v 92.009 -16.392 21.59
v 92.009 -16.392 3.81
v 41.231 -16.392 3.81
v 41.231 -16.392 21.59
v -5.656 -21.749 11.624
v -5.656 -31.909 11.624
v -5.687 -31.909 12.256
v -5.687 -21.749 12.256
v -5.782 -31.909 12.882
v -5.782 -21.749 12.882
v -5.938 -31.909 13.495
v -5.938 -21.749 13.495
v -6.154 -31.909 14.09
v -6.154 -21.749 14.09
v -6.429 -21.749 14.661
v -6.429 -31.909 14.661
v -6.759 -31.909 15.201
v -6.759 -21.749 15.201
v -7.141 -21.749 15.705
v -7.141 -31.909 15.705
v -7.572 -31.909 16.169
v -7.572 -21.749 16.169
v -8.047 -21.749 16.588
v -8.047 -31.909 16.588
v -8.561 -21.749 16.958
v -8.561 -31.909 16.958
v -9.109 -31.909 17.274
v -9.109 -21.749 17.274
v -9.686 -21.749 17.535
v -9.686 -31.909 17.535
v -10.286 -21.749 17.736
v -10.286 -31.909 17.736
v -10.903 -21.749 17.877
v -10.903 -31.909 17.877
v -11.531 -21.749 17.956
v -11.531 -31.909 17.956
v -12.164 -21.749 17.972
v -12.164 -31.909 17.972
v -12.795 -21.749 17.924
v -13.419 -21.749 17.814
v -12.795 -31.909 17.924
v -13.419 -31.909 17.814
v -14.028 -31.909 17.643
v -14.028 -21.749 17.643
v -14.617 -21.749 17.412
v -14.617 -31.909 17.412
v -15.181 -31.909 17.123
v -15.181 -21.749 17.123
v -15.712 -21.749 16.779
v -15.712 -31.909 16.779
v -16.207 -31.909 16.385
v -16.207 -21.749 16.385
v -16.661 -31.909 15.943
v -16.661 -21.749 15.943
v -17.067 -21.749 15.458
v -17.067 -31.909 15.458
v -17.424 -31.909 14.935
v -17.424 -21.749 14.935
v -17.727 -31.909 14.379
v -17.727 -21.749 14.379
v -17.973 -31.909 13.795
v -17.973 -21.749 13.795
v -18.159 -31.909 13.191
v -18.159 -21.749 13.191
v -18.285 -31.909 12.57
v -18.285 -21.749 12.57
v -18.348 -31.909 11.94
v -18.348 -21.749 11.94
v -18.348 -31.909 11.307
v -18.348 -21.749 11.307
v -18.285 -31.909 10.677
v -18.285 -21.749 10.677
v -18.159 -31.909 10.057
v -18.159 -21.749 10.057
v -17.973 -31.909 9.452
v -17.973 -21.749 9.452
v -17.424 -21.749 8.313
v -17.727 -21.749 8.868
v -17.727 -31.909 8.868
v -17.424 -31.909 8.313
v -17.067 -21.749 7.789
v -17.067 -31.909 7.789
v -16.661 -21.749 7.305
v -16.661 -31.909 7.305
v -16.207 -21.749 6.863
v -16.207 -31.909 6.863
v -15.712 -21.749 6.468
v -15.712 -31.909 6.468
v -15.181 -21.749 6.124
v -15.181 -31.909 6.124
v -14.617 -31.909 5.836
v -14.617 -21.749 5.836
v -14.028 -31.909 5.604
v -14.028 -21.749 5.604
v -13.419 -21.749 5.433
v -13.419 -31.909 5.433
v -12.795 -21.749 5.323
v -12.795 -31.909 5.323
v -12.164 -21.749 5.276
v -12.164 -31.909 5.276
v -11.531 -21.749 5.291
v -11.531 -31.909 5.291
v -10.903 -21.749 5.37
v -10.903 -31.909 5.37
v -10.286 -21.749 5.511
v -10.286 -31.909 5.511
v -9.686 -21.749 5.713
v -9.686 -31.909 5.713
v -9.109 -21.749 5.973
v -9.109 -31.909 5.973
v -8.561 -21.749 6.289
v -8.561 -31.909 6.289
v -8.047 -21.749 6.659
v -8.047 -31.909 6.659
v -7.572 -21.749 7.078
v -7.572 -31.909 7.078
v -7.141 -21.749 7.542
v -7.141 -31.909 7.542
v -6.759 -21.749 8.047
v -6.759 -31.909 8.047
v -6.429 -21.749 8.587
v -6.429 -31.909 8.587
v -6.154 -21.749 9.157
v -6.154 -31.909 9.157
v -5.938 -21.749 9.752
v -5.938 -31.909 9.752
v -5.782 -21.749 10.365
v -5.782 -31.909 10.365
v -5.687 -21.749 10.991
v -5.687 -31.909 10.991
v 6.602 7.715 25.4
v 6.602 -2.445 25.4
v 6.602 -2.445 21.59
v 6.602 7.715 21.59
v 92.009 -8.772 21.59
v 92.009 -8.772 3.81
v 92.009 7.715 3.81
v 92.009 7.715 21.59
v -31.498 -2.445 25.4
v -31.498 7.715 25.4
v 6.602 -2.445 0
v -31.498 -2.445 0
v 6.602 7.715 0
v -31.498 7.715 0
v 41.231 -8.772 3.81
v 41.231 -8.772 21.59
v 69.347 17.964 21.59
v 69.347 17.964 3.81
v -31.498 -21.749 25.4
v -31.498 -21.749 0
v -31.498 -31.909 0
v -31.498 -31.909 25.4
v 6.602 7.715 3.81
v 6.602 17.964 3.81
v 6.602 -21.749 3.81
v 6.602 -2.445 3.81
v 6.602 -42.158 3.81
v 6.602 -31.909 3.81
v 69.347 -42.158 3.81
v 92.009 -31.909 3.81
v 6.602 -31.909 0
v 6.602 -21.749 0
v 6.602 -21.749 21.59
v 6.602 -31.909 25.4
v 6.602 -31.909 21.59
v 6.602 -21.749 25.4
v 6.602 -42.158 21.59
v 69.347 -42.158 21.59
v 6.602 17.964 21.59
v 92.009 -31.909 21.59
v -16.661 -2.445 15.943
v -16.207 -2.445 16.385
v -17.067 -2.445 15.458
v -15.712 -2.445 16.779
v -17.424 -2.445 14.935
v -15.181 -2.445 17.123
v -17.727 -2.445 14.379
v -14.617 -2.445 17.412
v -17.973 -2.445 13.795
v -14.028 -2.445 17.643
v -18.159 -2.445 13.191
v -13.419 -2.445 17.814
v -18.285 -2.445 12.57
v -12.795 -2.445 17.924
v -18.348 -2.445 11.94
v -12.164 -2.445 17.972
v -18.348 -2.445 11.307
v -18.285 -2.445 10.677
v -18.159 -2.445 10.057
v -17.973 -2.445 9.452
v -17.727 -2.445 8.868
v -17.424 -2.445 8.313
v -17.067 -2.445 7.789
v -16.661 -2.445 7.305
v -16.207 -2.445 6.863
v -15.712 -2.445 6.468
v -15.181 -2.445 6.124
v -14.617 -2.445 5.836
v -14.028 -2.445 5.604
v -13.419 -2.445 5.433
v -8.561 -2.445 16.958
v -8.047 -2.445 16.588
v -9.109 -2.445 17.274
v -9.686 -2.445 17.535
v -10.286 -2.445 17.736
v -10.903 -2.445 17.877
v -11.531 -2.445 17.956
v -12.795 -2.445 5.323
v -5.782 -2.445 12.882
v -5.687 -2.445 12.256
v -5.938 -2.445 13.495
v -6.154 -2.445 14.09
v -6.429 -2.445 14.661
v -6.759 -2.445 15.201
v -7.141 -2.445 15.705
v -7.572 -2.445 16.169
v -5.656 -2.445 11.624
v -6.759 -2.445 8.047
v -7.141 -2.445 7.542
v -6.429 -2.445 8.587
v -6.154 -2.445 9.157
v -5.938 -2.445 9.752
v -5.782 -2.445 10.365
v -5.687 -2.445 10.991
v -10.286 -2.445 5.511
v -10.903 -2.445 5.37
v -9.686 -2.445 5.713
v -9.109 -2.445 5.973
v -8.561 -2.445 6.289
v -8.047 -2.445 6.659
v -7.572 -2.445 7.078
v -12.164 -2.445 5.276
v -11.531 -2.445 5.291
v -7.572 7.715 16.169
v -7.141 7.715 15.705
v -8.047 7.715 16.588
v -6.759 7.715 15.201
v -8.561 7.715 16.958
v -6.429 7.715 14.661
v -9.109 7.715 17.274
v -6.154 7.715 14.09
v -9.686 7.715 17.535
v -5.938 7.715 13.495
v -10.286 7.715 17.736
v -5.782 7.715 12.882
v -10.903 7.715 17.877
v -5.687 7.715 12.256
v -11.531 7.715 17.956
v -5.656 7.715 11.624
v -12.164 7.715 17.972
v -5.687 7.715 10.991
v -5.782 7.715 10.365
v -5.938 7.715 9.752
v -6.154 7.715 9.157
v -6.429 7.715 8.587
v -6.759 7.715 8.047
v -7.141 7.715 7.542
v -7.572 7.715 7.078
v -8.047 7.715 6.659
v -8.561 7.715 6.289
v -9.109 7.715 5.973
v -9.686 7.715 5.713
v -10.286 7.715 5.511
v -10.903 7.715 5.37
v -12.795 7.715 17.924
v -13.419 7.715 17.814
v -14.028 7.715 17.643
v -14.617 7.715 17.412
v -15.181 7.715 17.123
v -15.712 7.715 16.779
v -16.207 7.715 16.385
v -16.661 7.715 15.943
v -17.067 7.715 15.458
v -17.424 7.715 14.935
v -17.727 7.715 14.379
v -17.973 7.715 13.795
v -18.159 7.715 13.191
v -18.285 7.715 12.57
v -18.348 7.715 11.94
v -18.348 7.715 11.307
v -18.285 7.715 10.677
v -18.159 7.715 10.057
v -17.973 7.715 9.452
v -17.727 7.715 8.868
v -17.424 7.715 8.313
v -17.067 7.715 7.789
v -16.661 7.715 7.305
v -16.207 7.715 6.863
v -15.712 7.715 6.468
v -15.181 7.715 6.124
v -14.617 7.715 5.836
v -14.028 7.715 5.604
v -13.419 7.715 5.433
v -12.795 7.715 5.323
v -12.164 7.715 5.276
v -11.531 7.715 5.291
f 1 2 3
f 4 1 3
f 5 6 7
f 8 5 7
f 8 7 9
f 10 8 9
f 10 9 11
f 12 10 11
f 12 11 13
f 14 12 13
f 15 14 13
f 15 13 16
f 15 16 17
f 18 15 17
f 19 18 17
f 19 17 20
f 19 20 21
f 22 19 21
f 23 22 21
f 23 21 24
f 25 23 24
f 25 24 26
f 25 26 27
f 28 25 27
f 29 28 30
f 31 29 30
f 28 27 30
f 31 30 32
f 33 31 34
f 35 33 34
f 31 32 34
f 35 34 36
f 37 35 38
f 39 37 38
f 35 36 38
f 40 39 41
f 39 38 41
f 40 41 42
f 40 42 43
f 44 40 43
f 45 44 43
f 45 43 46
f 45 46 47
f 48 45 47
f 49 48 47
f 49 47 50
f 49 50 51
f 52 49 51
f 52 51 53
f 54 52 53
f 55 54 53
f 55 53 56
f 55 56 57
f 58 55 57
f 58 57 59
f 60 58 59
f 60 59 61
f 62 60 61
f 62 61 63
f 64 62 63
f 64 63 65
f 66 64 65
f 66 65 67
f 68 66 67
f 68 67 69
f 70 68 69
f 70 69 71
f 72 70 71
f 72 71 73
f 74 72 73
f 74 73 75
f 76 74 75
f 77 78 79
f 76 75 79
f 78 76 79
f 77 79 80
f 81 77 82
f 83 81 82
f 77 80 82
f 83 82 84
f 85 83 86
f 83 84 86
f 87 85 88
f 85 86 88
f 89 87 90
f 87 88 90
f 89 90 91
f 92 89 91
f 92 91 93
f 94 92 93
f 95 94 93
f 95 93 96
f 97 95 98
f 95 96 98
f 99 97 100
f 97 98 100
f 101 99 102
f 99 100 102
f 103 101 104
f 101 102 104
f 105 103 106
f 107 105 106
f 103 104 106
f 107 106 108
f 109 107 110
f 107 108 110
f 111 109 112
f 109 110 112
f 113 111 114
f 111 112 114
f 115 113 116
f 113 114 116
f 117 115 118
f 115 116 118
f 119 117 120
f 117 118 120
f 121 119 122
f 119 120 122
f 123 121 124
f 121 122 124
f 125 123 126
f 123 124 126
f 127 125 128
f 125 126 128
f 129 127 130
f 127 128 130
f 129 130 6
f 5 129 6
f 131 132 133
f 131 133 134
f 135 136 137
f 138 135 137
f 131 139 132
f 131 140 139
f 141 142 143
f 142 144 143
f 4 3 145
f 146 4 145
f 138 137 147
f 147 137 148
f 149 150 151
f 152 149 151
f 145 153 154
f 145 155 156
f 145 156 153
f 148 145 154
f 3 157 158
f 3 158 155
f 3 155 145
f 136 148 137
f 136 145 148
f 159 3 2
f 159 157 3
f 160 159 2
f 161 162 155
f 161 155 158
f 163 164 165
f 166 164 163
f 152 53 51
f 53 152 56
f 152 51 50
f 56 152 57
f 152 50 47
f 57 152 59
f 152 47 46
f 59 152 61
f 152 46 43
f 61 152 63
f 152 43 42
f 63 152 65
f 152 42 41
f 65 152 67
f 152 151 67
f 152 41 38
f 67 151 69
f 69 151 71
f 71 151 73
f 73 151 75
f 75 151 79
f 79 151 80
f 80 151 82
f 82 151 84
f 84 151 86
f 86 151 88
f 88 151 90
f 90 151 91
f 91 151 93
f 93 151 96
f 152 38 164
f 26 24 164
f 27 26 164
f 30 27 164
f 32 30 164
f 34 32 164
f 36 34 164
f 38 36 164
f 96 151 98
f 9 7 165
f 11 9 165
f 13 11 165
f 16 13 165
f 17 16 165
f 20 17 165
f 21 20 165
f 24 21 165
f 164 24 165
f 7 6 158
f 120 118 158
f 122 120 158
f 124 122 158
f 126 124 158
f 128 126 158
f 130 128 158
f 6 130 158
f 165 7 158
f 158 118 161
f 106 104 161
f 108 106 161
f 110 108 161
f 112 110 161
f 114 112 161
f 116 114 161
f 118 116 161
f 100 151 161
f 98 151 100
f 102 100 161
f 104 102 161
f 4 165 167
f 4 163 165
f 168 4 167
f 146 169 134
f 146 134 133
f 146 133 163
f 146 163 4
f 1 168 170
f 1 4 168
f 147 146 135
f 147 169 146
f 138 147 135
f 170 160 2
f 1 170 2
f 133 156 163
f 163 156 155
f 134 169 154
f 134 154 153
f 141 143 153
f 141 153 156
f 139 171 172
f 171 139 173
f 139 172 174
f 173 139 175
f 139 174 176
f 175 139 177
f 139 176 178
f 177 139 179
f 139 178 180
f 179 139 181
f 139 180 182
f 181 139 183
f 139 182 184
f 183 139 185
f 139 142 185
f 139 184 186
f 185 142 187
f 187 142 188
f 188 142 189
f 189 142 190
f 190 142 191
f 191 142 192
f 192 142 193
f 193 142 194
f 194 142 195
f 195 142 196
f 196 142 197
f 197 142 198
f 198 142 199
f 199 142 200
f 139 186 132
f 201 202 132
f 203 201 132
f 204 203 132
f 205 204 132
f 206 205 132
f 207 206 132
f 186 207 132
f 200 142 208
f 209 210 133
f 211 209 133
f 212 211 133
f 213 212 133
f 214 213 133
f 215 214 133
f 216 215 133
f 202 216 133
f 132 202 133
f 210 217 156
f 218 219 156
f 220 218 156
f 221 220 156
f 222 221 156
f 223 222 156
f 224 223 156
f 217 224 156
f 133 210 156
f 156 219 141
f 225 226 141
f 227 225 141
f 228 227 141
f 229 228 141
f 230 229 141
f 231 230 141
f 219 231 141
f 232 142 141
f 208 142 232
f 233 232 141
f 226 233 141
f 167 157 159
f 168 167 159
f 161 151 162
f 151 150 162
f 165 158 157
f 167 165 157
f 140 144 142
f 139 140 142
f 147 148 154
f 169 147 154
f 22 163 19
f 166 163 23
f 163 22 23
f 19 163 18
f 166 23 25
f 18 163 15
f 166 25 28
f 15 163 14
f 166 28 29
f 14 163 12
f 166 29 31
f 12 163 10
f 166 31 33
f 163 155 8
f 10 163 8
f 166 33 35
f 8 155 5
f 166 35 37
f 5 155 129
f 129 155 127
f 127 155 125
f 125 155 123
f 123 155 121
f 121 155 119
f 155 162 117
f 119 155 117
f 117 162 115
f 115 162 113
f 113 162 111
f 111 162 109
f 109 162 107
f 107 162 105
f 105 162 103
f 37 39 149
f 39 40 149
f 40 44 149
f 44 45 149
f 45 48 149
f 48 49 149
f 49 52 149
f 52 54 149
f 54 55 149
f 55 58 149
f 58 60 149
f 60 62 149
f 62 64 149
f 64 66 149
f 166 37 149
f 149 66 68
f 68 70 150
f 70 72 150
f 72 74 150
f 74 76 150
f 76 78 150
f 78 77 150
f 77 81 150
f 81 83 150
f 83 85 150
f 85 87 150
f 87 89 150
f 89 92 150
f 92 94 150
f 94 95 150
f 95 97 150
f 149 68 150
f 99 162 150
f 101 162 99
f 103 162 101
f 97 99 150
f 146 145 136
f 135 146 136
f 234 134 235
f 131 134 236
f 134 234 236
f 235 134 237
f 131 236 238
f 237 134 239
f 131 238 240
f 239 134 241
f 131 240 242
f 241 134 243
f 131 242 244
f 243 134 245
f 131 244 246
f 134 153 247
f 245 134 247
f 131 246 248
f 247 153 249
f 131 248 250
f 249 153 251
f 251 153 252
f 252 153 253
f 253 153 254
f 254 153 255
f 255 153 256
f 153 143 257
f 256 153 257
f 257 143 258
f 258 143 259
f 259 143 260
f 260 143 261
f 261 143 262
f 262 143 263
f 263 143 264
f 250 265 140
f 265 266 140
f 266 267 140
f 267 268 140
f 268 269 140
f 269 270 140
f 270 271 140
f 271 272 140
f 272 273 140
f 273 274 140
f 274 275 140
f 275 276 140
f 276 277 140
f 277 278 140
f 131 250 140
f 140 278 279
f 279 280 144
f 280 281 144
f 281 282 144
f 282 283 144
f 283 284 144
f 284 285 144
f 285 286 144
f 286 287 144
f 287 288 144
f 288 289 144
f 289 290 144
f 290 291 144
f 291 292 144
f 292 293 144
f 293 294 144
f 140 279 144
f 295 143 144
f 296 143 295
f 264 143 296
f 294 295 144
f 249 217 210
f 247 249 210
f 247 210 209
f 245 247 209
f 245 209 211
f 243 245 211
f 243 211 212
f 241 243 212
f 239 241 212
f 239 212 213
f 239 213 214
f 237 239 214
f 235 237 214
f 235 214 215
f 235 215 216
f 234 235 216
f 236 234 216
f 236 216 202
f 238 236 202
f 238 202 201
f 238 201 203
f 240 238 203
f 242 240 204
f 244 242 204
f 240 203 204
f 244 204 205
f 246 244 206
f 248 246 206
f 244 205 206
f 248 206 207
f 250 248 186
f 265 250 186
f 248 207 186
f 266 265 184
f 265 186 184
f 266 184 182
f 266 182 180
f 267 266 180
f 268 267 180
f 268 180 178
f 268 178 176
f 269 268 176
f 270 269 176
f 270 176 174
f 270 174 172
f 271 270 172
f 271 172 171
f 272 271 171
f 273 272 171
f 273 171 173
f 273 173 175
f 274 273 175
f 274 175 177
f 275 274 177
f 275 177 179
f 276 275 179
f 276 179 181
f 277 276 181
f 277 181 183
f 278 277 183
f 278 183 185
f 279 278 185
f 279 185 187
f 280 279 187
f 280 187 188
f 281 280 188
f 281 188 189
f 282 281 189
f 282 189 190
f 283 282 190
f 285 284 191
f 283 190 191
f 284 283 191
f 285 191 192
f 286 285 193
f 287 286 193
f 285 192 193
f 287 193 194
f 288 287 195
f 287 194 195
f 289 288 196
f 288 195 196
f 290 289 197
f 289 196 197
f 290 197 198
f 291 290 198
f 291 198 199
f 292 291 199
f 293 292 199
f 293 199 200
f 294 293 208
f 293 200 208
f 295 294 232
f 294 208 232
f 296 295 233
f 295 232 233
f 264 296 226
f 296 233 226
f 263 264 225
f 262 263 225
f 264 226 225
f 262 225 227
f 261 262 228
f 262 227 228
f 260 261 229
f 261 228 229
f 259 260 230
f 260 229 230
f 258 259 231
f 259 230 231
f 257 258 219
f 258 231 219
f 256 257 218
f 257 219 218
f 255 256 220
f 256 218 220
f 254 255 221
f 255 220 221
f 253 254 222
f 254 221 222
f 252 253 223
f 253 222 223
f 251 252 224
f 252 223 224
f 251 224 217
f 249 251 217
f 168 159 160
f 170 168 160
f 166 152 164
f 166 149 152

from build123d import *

# Parameters (mm, degrees)
F1_DEPTH = 25.4
F3_D     = 12.7
F4_W     = 94.8301074147
F4_H     = 68.1190363509
F5_DEPTH = 3.81
F6_W     = 94.6228546143
F6_H     = 76.2625485659
F7_DEPTH = 3.81


with BuildPart() as f1:
    # F0 (on Top) → F1 (new body)
    with BuildSketch(Plane.XY):
        Polygon((69.3474411964, -42.1580038965), (92.0092580879, -31.9088696007), (92.0092580879, -16.3924994838), (41.2310734391, -16.3924994838), (41.2310734391, -12.5824994838), (41.2310734391, -8.7724994838), (92.0092580879, -8.7724994838), (92.0092580879, 7.7151303993), (69.3474411964, 17.9642646951), (6.6018956661, 17.9642646951), (6.6018956661, 7.7151303993), (-31.4981043339, 7.7151303993), (-31.4981043339, -2.4448696007), (-12.4481043339, -2.4448696007), (6.6018956661, -2.4448696007), (6.6018956661, -21.7488696007), (-31.4981043339, -21.7488696007), (-31.4981043339, -31.9088696007), (6.6018956661, -31.9088696007), (6.6018956661, -42.1580038965), align=None)
    extrude(amount=F1_DEPTH)

    # F3 (through all)
    with Locations(Plane(origin=(0, 7.7151303993, 0), x_dir=(-1, 0, 0), z_dir=(0, 1, 0))):
        with Locations((12.0056932792, 11.6236191243)):
            Hole(F3_D / 2)

    # F4 (on face) → F5 (cut)
    with BuildSketch(Plane.XY.offset(25.4)):
        with Locations((54.0169493735, -16.0952534803)):
            Rectangle(F4_W, F4_H)
    extrude(amount=-F5_DEPTH, mode=Mode.SUBTRACT)

    # F6 (on face) → F7 (cut)
    with BuildSketch(Plane(origin=(0, 0, 0), x_dir=(1, 0, 0), z_dir=(0, 0, -1))):
        with Locations((53.9133229733, 4.0267296135)):
            Rectangle(F6_W, F6_H)
    extrude(amount=-F7_DEPTH, mode=Mode.SUBTRACT)


solid = f1.part
